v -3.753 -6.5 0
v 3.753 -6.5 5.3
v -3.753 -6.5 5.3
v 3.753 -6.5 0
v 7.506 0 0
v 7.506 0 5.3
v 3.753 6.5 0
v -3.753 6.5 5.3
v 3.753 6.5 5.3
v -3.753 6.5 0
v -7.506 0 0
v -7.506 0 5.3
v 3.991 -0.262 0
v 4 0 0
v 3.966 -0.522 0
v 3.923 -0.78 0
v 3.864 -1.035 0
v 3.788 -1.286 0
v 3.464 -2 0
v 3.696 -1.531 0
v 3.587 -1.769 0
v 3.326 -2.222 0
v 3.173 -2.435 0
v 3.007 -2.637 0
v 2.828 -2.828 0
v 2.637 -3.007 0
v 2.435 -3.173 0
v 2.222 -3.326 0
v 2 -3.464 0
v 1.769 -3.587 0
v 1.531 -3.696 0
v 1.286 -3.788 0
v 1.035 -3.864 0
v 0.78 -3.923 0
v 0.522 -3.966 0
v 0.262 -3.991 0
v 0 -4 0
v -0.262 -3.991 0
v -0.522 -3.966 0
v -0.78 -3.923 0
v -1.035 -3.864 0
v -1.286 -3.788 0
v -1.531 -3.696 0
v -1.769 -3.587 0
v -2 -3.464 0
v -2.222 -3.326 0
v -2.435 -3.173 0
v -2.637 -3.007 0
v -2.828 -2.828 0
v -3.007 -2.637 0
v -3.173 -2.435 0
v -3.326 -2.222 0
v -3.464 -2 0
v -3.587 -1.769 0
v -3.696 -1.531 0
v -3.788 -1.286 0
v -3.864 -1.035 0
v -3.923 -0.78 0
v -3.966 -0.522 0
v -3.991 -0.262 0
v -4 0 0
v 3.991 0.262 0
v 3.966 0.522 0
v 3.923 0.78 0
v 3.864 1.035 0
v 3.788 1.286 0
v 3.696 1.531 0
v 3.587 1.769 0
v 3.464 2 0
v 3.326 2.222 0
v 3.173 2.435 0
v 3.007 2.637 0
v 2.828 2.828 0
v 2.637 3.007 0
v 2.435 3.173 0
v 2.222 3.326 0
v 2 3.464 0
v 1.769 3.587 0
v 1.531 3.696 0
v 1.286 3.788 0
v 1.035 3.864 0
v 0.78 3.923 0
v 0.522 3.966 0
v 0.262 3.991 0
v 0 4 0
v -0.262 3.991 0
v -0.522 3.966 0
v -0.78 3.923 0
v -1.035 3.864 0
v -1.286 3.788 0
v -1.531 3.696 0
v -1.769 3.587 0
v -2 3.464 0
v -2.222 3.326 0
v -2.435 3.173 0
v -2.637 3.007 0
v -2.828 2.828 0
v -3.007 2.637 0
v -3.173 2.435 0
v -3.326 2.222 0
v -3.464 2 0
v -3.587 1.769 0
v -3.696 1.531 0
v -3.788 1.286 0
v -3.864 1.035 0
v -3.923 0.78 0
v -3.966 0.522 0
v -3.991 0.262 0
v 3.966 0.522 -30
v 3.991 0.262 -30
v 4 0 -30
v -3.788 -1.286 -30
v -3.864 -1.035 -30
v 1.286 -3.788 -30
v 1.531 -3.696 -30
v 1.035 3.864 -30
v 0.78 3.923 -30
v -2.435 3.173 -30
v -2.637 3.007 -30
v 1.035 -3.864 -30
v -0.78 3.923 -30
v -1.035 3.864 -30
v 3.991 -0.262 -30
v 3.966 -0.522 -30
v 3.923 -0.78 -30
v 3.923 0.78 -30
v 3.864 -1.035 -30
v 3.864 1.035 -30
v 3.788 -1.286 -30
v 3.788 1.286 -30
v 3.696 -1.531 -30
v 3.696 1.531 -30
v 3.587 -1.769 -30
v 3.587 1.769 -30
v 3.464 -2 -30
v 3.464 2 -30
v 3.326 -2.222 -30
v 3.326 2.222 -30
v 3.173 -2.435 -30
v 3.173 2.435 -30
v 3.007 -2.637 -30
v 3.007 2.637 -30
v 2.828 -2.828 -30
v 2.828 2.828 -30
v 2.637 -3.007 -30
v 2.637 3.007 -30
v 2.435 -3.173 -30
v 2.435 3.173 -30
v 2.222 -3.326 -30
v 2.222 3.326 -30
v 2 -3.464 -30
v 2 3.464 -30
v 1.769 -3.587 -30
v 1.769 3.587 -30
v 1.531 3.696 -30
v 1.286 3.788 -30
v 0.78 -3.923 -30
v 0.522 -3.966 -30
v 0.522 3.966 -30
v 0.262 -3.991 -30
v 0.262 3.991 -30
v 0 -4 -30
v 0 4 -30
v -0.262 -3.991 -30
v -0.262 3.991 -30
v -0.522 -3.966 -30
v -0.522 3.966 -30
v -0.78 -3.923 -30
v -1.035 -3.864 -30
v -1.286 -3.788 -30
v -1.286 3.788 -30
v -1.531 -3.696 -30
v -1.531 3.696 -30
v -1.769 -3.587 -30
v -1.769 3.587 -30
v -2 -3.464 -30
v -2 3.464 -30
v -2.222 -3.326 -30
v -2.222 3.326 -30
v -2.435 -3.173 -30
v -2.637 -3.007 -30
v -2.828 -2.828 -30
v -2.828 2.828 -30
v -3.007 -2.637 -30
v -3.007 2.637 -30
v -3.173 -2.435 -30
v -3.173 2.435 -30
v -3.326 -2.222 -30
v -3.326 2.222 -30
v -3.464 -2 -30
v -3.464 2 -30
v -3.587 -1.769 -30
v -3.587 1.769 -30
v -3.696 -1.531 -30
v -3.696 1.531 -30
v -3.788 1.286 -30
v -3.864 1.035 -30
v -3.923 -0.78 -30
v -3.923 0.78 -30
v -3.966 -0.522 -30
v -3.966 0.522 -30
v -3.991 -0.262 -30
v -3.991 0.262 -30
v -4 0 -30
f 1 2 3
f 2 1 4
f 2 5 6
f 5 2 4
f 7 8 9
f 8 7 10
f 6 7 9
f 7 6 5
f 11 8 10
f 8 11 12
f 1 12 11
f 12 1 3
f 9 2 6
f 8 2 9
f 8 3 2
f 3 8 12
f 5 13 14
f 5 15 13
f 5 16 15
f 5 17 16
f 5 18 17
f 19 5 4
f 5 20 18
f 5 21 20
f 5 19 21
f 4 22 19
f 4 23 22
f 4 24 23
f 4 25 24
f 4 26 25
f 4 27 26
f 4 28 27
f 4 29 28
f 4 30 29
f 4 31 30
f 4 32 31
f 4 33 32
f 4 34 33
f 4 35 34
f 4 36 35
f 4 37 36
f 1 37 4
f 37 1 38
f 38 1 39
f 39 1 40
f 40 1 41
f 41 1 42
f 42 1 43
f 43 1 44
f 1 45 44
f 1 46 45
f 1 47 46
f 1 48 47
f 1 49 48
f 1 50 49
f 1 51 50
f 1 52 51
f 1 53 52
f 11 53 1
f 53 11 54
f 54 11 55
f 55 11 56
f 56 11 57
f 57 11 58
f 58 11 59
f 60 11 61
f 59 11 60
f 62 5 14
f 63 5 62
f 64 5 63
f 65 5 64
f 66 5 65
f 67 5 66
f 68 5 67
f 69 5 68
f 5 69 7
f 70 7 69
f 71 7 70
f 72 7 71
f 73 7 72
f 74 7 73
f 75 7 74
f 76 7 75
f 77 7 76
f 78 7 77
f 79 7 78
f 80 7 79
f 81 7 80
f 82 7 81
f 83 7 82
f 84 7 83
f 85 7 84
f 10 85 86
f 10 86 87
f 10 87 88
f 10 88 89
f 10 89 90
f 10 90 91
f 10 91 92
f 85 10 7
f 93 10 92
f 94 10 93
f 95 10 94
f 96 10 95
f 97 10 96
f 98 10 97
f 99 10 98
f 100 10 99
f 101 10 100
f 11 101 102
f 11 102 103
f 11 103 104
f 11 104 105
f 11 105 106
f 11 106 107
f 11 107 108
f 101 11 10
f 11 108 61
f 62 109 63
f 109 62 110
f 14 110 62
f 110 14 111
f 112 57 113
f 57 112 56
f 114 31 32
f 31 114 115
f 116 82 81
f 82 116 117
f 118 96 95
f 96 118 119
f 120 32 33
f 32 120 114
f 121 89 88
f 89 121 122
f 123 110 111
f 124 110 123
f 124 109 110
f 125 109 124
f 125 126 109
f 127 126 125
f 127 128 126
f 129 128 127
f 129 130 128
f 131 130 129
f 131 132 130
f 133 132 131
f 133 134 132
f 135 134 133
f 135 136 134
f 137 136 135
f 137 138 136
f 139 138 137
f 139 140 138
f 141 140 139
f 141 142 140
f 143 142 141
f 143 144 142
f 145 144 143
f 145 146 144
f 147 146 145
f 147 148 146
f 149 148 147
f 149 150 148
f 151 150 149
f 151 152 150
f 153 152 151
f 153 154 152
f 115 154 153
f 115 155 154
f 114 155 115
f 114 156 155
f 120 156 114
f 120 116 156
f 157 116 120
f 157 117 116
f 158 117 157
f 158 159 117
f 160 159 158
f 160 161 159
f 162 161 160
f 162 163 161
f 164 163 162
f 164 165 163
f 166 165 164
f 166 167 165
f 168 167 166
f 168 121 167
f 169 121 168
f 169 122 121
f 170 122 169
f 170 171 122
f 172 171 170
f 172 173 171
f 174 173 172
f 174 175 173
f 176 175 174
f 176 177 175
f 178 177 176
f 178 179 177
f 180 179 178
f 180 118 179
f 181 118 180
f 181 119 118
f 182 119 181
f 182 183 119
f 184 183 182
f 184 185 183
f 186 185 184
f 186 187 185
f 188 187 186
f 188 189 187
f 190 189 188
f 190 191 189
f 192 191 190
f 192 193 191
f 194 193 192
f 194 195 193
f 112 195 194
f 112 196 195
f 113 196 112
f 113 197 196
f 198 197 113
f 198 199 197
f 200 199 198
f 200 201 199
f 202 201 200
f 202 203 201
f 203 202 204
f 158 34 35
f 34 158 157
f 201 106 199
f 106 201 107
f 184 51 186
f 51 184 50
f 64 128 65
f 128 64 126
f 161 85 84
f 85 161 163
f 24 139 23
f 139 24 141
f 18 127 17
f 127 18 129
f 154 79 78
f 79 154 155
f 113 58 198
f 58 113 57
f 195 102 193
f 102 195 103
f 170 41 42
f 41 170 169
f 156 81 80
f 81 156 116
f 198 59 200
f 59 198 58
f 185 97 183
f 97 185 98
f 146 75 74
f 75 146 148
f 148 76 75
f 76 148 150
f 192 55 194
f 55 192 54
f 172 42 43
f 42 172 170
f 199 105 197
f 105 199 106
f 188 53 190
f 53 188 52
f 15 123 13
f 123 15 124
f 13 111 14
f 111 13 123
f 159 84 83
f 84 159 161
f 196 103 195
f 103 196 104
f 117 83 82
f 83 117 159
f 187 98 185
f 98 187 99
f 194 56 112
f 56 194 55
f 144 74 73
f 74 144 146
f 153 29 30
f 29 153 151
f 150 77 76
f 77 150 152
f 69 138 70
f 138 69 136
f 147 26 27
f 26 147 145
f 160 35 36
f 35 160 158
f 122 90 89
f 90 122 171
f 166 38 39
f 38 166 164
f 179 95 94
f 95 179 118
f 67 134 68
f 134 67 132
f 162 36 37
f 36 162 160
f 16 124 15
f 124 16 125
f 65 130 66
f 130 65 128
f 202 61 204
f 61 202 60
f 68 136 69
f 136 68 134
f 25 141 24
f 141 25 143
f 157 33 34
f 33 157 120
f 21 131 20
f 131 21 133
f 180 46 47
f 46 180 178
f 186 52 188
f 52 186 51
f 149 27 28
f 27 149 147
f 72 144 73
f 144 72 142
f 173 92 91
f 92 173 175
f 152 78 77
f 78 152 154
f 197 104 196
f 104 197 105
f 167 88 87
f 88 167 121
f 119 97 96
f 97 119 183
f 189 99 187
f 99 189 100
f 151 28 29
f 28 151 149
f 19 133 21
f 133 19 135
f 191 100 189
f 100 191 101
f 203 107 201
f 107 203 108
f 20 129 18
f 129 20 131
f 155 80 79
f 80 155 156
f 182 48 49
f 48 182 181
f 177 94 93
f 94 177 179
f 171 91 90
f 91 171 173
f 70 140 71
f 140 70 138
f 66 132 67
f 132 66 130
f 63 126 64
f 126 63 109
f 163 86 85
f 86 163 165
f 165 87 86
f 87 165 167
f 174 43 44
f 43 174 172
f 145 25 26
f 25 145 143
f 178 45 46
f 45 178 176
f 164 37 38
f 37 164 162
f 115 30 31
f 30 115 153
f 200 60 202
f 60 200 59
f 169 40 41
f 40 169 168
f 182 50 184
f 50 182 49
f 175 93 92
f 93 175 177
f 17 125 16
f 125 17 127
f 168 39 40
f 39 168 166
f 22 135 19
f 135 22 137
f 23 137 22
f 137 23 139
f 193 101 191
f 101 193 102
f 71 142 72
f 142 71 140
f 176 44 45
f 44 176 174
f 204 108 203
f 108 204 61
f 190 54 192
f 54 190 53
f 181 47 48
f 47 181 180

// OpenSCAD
// M8 六角ボルト（単位: mm、ねじ山省略）
head_across_flats = 13;
head_height = 5.3;
shank_diameter = 8;
shank_length = 30;

// 正六角形の外接円半径 = 対辺距離 / (2 * cos(30°))
head_radius = head_across_flats / (2 * cos(30));

union() {
    // 頭部: z = 0 ～ 5.3
    cylinder(h = head_height, r = head_radius, $fn = 6);

    // シャンク: z = -30 ～ 0
    translate([0, 0, -shank_length])
        cylinder(h = shank_length, d = shank_diameter, $fn = 96);
}
